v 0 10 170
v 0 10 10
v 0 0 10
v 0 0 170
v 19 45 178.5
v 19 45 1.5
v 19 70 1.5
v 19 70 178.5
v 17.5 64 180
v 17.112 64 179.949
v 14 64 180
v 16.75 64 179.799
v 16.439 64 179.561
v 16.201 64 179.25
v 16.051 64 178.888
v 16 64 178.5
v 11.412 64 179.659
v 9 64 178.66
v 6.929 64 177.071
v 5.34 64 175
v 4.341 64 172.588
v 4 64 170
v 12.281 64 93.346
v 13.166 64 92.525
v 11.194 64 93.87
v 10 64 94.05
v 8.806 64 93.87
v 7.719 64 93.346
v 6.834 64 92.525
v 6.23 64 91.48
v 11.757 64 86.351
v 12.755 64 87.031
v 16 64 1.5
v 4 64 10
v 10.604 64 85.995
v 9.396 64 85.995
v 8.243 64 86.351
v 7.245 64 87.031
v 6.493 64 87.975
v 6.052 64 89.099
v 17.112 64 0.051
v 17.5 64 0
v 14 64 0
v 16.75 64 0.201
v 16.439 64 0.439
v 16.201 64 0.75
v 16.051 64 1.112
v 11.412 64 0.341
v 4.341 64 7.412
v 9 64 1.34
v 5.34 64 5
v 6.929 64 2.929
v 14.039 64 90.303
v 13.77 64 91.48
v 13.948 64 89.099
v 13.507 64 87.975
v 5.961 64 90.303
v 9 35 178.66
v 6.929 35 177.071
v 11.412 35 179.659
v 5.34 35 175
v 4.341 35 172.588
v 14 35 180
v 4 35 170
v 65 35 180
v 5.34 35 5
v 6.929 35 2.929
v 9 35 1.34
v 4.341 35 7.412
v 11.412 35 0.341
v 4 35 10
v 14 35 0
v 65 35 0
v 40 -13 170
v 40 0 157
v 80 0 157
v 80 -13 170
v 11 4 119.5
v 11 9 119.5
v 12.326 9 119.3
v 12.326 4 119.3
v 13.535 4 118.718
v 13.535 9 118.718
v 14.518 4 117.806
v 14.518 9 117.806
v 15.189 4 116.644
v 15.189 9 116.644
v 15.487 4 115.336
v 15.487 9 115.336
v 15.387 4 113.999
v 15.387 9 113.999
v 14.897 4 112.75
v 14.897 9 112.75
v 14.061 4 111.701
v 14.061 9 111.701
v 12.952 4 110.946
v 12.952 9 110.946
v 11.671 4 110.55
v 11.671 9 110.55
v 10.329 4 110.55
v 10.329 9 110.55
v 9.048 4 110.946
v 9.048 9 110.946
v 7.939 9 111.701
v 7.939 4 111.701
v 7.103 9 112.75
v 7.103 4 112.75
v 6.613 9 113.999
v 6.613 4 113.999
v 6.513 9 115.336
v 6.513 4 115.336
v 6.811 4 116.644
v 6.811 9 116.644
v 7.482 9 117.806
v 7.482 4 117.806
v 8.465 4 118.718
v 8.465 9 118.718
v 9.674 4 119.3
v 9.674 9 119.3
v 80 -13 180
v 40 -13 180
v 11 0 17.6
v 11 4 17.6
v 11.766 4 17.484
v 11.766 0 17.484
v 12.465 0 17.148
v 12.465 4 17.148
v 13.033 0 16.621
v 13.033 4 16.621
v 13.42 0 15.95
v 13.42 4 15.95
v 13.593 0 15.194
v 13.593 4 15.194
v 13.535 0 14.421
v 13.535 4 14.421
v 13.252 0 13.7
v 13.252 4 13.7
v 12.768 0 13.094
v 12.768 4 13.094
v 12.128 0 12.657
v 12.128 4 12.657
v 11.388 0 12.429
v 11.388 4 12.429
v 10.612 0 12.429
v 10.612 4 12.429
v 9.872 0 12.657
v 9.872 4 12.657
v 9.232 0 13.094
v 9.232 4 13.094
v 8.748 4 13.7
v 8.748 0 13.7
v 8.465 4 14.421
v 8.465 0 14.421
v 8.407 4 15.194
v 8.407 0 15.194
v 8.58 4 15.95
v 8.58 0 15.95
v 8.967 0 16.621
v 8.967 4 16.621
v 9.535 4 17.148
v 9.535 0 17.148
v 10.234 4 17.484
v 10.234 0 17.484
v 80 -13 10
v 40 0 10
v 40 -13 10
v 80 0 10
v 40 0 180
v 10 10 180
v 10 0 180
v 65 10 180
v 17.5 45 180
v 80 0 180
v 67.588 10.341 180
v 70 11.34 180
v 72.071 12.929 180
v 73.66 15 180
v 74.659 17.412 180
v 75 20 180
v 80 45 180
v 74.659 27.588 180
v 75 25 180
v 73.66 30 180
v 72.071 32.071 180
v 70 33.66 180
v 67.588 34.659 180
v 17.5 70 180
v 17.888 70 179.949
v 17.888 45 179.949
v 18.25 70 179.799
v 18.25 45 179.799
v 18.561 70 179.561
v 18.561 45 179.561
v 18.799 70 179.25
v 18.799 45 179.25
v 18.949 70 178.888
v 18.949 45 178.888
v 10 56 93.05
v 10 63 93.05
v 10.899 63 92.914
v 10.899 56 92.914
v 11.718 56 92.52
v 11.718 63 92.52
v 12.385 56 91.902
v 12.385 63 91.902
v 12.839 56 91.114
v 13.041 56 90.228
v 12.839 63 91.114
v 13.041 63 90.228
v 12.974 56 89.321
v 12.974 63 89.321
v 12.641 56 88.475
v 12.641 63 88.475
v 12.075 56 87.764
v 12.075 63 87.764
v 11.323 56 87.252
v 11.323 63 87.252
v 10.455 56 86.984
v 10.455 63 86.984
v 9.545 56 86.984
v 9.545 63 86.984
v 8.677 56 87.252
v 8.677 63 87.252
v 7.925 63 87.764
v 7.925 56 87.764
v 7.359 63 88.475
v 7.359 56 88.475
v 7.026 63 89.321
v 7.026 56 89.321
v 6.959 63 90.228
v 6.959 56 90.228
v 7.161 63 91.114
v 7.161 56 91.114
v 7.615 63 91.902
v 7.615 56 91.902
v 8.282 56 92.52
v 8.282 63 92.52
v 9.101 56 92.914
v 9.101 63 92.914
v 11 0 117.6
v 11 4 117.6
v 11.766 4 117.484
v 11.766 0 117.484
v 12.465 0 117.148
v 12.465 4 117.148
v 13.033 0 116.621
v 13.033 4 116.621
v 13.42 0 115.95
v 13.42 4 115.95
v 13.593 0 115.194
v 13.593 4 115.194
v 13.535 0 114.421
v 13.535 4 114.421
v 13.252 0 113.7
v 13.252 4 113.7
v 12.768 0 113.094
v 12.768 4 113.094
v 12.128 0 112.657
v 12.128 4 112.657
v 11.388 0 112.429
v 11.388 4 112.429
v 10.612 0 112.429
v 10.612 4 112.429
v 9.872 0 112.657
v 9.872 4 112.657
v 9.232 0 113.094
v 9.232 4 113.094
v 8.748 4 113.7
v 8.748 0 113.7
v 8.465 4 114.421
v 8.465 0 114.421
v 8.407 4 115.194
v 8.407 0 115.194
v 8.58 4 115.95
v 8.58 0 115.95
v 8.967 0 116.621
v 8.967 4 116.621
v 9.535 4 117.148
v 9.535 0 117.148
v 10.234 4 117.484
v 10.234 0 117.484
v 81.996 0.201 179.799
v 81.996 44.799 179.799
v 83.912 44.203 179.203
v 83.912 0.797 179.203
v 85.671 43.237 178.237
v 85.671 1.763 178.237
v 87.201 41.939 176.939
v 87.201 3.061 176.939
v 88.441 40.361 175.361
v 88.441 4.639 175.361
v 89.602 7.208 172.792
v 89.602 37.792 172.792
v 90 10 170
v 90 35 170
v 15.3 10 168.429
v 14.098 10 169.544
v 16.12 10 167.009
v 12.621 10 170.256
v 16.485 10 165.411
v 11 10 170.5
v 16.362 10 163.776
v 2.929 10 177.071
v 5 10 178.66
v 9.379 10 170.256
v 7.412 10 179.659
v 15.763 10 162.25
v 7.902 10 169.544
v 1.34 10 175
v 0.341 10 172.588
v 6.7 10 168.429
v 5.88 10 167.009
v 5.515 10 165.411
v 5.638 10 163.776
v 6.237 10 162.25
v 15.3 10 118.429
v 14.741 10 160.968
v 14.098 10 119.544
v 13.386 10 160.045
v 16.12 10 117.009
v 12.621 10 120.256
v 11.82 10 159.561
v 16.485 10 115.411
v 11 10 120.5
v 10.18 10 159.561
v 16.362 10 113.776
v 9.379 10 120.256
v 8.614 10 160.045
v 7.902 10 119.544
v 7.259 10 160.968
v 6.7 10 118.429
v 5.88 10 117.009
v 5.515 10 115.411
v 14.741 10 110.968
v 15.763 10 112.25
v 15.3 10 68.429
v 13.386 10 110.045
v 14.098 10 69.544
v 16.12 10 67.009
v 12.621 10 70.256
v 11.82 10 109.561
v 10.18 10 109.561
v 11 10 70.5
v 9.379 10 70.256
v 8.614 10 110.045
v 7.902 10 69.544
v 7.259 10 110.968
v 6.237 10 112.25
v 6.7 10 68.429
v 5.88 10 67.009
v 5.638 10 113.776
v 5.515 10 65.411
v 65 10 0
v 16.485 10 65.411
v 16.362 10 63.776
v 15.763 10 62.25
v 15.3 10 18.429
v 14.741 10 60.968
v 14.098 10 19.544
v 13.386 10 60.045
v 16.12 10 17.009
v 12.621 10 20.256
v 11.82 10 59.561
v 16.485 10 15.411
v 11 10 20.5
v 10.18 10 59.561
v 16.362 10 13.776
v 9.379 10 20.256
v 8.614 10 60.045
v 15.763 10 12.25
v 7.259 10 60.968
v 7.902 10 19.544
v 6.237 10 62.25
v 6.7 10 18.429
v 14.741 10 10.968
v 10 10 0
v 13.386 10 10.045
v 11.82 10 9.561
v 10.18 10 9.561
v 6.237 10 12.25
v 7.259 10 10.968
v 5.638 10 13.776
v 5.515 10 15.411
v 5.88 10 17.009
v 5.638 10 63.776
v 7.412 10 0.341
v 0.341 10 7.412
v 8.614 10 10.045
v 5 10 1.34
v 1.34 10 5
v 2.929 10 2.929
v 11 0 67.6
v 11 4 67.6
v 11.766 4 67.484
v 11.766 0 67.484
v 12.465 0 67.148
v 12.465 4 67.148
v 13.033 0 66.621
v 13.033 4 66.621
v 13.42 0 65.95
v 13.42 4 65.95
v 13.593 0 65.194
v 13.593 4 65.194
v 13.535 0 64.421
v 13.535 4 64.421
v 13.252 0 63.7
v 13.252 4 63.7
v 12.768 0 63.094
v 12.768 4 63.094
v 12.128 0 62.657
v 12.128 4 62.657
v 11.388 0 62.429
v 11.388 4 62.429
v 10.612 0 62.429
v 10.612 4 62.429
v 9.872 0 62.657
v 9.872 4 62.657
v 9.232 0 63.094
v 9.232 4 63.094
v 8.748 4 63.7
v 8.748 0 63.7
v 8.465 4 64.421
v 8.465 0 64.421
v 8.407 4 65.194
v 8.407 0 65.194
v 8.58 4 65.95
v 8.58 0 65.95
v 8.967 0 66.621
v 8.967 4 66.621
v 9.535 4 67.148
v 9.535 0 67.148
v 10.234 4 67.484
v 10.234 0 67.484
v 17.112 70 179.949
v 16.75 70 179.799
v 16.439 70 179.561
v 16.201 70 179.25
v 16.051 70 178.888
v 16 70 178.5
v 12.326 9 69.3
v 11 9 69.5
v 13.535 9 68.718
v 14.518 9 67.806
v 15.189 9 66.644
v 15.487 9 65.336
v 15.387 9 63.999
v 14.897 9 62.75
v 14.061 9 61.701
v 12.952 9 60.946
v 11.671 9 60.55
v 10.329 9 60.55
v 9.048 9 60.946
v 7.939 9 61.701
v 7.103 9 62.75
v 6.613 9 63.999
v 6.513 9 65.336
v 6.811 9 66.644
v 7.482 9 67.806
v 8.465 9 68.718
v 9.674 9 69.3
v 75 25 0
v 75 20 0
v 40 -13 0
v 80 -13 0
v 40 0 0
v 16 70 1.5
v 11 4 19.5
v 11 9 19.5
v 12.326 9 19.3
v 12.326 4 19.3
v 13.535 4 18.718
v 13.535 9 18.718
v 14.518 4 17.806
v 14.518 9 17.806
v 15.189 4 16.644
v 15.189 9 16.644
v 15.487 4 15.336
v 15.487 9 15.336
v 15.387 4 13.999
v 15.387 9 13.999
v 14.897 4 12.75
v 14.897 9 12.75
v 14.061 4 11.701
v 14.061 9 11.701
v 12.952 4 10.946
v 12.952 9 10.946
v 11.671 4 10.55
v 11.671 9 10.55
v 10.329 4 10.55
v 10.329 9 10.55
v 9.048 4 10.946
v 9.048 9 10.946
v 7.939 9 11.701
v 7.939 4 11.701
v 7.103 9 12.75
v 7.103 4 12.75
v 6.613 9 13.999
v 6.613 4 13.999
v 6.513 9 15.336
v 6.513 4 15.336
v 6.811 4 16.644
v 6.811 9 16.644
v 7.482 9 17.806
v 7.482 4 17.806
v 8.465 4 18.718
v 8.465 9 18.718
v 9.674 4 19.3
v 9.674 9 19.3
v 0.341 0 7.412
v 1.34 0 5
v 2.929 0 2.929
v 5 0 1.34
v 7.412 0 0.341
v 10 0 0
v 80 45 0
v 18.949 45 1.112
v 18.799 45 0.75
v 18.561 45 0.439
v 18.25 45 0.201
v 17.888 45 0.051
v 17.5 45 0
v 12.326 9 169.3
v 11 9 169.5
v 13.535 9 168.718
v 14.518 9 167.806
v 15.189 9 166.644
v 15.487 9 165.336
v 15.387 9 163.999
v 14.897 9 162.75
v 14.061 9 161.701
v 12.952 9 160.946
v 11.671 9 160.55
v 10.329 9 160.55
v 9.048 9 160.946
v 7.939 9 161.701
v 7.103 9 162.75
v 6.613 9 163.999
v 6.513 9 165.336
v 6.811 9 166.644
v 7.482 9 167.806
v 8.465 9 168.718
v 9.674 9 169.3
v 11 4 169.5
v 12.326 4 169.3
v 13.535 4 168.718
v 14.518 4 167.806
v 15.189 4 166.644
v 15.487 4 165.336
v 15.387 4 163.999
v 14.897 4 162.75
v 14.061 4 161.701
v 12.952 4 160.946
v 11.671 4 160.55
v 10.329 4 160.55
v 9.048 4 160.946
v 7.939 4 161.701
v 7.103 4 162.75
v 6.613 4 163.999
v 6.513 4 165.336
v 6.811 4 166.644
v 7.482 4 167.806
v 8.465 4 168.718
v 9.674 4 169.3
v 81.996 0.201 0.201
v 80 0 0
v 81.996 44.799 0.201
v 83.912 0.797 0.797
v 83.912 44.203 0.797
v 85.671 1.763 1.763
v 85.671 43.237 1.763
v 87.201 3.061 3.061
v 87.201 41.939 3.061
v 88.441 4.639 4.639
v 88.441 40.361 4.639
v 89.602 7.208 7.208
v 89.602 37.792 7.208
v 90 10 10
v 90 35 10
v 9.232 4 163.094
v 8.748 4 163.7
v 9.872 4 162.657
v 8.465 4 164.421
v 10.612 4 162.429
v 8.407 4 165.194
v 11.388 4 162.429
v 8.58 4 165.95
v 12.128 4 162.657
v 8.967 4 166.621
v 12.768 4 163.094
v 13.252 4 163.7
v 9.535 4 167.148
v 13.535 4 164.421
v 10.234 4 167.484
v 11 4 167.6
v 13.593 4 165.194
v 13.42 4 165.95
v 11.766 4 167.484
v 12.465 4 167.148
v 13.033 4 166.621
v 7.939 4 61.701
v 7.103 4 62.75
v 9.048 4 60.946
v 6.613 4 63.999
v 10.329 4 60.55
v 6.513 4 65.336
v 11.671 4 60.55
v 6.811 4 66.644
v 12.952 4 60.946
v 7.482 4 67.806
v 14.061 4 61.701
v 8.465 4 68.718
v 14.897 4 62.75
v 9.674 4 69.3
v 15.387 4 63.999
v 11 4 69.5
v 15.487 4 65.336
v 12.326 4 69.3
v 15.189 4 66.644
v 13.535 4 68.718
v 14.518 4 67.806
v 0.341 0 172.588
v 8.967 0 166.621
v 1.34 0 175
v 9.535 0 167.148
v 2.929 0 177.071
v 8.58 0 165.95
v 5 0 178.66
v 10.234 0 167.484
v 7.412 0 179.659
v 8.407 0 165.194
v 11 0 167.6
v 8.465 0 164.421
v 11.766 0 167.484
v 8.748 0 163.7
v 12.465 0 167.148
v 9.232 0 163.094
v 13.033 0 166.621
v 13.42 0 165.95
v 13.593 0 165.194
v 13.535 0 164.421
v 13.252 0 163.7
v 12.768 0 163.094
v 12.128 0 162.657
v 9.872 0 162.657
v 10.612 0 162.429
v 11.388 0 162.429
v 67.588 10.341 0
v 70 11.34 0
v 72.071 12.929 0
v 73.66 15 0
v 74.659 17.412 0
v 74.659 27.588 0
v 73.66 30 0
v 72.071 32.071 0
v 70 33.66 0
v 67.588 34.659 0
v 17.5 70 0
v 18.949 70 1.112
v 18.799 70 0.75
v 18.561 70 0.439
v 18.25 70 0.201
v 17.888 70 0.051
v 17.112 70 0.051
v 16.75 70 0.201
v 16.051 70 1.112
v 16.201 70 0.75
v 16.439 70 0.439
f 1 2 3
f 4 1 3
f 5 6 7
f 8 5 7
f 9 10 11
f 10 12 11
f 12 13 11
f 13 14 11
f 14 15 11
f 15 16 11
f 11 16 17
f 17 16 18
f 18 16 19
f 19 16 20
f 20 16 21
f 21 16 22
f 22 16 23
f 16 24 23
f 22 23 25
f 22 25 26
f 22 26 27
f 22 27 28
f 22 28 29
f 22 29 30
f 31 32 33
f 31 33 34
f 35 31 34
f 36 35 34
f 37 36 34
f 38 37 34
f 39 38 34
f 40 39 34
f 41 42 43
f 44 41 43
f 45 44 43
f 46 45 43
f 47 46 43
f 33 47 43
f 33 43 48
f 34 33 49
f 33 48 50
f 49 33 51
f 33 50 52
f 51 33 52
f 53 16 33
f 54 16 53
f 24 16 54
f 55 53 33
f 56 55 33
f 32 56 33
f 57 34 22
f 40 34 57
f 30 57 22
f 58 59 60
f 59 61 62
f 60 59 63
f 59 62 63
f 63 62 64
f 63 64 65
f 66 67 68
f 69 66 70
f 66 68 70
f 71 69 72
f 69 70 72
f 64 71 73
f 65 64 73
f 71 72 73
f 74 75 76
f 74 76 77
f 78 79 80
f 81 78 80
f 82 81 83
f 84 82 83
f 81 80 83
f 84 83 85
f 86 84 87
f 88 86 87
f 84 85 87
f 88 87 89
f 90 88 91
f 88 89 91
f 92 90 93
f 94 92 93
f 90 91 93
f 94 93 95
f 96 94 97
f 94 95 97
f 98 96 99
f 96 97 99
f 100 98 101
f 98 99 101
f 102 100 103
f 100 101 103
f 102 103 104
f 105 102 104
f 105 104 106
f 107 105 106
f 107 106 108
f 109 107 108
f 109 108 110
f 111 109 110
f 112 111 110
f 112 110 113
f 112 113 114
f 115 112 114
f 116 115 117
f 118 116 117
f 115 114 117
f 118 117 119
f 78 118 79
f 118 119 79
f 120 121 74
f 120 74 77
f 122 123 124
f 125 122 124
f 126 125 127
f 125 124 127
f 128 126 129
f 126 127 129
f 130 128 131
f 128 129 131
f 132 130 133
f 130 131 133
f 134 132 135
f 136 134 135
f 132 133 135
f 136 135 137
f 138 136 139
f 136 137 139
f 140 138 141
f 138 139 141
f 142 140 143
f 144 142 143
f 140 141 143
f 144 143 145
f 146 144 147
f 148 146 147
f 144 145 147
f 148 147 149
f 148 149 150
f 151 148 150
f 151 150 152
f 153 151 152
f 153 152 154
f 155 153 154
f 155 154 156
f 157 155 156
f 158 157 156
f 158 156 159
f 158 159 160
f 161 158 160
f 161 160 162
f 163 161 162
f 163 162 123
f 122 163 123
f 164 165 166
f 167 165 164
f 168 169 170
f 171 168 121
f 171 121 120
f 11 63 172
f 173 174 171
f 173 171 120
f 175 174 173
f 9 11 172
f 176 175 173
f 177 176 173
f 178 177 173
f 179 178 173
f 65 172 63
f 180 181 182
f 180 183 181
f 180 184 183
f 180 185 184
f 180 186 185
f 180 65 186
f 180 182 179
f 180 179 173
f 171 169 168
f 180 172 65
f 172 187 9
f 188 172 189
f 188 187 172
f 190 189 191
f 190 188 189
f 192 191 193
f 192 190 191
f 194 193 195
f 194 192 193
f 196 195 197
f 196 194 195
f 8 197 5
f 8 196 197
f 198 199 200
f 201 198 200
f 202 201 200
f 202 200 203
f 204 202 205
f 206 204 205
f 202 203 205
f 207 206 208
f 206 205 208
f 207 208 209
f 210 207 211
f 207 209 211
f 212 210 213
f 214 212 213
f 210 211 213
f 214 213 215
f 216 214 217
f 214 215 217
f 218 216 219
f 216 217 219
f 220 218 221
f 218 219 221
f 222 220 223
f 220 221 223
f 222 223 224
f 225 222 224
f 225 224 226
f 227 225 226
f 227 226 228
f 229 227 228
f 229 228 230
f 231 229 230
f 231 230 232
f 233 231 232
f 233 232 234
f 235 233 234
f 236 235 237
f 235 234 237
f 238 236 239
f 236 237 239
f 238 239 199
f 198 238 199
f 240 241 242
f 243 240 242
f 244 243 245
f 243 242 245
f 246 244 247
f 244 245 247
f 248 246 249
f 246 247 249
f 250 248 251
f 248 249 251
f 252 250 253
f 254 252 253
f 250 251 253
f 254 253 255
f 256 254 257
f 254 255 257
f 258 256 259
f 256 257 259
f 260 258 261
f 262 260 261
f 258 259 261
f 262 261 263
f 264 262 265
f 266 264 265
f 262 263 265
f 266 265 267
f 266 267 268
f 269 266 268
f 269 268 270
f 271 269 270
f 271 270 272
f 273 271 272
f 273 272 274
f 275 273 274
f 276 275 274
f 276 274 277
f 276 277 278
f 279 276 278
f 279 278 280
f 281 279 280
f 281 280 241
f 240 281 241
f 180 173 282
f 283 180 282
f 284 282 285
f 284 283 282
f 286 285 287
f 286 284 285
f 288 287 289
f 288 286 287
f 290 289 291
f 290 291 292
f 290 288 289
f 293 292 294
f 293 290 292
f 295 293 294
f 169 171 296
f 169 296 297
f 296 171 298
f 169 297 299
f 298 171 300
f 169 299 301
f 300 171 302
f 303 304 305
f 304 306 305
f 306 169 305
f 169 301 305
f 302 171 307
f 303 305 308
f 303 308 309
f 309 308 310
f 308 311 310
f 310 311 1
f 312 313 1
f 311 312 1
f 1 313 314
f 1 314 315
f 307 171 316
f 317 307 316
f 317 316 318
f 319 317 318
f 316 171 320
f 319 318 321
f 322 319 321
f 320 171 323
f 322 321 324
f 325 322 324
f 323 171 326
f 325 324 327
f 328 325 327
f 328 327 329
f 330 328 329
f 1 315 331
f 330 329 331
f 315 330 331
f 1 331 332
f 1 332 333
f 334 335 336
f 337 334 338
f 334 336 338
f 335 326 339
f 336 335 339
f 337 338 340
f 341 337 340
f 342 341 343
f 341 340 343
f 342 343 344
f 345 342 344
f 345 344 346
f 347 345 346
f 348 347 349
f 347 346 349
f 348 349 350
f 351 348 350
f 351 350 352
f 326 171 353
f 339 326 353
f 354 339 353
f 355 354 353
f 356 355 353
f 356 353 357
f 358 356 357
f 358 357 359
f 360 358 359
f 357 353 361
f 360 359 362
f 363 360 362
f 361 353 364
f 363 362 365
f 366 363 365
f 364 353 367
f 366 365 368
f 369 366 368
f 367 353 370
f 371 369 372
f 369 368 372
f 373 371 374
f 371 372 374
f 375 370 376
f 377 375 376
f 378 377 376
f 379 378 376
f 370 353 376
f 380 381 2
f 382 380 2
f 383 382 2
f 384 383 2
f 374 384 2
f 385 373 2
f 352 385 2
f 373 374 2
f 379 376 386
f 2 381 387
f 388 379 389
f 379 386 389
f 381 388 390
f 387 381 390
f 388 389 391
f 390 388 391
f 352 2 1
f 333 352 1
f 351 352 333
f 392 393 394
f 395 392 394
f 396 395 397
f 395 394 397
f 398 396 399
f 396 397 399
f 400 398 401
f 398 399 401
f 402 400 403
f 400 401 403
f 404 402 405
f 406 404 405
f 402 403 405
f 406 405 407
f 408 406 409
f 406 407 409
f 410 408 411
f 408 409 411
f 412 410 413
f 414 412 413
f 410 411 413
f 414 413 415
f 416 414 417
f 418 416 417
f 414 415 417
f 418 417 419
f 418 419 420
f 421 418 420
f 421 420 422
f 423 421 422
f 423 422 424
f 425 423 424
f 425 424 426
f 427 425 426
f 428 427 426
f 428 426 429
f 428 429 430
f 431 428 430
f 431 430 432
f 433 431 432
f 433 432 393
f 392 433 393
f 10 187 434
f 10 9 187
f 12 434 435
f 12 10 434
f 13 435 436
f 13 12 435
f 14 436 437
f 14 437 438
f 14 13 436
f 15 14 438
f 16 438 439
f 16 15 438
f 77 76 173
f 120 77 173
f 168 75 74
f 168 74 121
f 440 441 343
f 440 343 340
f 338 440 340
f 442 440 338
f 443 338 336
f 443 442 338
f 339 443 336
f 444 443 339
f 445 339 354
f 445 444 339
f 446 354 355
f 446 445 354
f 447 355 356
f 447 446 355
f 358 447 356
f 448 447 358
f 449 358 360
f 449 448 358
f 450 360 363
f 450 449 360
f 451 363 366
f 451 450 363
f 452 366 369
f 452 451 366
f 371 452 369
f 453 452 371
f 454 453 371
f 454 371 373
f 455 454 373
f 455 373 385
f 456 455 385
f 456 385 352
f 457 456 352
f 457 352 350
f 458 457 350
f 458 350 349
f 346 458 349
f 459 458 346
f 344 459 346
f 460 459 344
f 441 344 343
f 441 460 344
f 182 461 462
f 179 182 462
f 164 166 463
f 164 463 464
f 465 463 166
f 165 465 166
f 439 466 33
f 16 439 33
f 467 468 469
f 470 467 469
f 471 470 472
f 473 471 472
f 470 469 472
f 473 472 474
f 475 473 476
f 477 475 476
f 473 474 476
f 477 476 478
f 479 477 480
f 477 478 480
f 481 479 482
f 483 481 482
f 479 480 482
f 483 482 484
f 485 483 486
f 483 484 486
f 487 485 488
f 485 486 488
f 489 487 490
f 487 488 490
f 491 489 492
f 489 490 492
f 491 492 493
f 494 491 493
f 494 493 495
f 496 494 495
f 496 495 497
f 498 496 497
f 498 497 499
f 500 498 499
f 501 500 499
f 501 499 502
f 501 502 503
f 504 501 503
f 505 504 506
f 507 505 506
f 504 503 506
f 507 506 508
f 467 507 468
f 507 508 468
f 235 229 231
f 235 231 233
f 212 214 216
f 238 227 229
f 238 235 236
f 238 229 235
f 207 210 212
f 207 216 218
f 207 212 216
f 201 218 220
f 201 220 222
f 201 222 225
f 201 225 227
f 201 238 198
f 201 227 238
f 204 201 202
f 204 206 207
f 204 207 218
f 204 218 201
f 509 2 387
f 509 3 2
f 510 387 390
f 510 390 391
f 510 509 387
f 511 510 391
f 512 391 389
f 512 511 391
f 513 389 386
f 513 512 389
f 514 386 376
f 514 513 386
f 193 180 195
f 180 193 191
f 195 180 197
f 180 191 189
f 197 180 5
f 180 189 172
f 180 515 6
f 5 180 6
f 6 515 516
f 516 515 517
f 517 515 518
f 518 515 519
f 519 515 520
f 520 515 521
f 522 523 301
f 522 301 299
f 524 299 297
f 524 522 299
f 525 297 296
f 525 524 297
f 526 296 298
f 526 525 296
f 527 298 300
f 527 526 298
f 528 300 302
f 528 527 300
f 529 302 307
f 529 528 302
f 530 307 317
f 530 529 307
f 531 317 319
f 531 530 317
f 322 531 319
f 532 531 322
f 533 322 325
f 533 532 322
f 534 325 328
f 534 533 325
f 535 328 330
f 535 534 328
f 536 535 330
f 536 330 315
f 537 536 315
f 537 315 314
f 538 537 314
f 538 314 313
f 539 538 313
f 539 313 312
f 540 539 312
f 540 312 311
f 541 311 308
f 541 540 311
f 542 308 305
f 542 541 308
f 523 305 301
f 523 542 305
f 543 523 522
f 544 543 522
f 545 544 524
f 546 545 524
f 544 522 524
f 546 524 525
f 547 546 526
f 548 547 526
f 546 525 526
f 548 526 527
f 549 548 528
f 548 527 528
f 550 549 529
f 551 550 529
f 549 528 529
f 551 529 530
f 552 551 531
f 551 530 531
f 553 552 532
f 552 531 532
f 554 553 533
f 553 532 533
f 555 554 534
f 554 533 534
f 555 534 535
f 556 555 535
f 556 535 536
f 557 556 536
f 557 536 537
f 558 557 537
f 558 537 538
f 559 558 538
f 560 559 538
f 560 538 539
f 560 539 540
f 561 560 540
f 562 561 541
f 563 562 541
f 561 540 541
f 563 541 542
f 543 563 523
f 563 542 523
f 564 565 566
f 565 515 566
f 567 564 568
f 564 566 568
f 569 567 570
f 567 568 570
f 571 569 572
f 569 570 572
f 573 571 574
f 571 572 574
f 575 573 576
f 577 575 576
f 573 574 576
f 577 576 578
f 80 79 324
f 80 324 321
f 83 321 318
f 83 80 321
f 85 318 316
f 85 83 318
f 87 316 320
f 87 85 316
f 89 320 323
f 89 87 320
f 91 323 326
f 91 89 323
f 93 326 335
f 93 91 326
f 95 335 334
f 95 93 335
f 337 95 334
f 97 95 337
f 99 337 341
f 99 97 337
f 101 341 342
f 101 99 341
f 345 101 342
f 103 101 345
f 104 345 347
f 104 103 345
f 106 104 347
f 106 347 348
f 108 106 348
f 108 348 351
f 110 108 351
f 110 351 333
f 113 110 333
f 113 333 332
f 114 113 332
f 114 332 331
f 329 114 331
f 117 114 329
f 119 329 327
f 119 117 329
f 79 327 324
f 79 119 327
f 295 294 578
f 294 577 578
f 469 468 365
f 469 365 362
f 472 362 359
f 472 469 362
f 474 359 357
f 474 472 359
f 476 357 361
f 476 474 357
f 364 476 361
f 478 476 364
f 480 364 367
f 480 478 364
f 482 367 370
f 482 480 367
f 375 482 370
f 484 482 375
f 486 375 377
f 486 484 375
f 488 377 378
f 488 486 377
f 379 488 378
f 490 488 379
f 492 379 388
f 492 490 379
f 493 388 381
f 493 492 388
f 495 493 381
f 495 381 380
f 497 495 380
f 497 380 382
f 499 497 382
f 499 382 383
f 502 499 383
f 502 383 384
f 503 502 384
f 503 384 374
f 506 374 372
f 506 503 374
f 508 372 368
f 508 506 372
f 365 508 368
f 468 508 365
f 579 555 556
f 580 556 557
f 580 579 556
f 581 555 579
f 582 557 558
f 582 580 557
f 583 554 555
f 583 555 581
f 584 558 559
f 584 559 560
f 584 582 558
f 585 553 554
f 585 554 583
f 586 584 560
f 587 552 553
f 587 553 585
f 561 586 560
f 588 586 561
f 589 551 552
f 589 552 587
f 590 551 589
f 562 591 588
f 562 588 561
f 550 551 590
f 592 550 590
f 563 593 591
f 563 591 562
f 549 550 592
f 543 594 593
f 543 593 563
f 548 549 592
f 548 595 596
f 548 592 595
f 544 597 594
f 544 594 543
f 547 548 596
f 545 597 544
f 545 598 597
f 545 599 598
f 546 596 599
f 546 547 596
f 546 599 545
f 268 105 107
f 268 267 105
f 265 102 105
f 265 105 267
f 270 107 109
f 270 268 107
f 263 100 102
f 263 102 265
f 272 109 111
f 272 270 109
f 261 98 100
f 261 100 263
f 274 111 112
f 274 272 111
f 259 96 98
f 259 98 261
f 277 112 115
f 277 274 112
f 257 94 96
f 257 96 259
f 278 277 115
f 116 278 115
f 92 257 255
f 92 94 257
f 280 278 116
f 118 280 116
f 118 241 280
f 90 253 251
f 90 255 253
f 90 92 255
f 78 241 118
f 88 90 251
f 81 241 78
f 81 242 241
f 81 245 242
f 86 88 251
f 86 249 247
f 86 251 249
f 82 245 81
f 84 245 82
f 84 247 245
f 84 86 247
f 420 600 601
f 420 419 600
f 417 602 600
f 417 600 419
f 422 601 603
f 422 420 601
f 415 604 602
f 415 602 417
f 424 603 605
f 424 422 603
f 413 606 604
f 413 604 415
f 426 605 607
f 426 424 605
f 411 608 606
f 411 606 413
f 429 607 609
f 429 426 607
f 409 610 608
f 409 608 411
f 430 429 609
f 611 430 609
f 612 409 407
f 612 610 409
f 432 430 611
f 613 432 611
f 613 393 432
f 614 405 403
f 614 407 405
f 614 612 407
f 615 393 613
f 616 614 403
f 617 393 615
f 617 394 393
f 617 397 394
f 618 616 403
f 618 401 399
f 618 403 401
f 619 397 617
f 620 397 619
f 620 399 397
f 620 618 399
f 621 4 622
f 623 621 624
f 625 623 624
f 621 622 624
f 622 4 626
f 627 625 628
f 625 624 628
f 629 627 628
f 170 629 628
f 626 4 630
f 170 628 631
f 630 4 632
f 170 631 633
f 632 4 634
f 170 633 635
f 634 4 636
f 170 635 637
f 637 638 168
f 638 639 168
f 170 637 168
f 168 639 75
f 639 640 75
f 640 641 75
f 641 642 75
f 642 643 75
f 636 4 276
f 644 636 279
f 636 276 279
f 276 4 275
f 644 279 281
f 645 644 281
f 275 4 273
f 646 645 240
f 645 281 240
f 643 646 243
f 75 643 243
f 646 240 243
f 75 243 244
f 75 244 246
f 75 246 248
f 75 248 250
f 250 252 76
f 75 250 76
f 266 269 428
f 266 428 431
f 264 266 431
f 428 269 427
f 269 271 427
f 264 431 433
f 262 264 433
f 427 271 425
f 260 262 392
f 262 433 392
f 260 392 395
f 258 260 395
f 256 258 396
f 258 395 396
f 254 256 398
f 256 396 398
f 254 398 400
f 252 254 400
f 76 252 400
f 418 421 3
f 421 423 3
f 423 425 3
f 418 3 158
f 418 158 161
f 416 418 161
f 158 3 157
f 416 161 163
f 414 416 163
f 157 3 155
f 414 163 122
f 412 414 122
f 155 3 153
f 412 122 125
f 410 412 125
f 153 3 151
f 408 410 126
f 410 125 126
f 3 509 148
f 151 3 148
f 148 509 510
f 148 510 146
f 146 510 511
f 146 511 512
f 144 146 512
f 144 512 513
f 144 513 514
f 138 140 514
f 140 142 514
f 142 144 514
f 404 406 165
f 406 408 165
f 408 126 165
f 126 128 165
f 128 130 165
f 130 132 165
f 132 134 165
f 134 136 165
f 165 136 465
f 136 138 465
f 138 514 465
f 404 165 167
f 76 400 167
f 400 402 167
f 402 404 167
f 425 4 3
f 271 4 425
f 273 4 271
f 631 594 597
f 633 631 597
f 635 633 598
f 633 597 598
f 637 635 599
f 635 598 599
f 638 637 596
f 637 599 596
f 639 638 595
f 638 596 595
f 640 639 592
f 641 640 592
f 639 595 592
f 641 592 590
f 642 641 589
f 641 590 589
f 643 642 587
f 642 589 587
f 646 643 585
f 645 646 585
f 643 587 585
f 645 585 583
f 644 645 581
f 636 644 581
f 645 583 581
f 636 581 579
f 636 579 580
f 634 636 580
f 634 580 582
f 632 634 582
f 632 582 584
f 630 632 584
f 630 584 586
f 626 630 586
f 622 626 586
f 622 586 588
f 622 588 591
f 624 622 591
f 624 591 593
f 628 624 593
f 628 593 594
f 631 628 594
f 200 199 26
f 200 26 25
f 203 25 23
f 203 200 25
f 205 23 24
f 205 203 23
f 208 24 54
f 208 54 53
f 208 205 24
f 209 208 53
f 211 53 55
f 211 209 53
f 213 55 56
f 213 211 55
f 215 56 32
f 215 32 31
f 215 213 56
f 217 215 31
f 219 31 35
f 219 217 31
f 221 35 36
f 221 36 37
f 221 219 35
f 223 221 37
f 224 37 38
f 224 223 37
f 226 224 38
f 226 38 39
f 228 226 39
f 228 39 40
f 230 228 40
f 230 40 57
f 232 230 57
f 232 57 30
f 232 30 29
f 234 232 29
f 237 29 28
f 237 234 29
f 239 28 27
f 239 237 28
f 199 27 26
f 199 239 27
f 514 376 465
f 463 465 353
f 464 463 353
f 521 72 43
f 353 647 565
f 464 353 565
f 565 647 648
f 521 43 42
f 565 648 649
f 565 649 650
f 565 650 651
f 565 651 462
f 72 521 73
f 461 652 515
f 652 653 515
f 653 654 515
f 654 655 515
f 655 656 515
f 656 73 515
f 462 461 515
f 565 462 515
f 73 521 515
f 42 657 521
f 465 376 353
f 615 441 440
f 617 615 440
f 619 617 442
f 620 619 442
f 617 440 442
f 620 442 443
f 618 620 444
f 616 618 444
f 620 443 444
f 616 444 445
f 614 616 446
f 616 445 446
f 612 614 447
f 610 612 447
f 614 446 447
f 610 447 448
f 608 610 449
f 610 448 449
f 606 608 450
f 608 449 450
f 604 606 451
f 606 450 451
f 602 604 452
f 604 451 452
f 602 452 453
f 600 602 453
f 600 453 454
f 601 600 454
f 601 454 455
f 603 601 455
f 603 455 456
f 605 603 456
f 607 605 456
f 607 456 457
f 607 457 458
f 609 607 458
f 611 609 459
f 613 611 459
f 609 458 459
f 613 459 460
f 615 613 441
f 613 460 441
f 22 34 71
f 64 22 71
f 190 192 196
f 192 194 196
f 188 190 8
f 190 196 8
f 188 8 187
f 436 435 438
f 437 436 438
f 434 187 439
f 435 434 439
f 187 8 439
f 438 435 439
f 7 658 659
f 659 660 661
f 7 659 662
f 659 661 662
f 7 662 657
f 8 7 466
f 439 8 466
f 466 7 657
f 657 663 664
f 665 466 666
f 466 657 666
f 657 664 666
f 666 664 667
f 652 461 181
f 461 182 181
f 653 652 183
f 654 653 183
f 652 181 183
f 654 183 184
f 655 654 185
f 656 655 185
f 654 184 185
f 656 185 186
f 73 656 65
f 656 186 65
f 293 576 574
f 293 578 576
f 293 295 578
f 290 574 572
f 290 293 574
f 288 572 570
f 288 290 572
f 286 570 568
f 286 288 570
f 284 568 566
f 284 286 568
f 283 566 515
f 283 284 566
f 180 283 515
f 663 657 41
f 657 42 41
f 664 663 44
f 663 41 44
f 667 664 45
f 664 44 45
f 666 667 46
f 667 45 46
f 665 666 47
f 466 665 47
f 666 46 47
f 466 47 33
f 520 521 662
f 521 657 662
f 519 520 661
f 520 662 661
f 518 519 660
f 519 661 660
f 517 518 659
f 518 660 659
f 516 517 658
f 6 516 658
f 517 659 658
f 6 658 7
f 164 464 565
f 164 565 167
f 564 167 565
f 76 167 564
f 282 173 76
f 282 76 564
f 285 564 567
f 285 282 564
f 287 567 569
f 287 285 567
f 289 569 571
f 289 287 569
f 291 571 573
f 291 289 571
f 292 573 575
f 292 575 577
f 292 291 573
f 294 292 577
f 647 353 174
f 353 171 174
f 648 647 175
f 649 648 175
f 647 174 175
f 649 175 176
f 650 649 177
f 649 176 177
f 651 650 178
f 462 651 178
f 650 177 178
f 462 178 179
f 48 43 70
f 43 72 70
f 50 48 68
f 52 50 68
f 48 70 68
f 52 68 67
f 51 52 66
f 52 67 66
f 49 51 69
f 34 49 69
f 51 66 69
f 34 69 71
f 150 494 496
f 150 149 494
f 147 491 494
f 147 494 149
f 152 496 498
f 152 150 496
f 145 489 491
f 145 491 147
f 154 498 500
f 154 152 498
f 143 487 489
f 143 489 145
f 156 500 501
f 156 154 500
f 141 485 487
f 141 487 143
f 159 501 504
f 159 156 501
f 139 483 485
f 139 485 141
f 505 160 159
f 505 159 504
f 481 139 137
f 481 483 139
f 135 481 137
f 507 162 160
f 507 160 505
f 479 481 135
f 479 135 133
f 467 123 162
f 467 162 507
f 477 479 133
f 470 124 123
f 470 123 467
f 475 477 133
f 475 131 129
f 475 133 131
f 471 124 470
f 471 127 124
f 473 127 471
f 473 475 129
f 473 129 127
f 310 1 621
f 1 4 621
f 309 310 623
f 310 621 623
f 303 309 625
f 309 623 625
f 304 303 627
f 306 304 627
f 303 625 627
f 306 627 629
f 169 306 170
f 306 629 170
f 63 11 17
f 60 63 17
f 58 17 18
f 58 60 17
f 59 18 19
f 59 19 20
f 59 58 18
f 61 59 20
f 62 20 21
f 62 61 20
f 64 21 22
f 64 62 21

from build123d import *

# Parameters (mm, degrees)
BOSS_EXTRUDE1_DEPTH = 180
SKETCH2_R           = 2.6
CUT_EXTRUDE1_DEPTH  = 211
SKETCH2_3_R         = 4.5
CUT_EXTRUDE2_DEPTH  = 6
SKETCH3_R           = 3.05
CUT_EXTRUDE3_DEPTH  = 8
FILLET4_R           = 10
CHAMFER1_SIZE       = 1
FILLET5_R           = 1.5
SKETCH4_W           = 40
SKETCH4_H           = 10
BOSS_EXTRUDE2_DEPTH = 13
CHAMFER2_SIZE       = 13


# Some blends are built 0.0001 mm under size
with BuildPart() as part:
    # Sketch1 → Boss-Extrude1 (new body)
    with BuildSketch(Plane.XY):
        Polygon((0, 10), (0, 0), (90, 0), (90, 45), (19, 45), (19, 70), (16, 70), (16, 64), (4, 64), (4, 35), (75, 35), (75, 10), align=None)
    extrude(amount=BOSS_EXTRUDE1_DEPTH)

    # Sketch2 → Cut-Extrude1 (cut, through all)
    with BuildSketch(Plane(origin=(0, 10, 0), x_dir=(1, 0, 0), z_dir=(0, 1, 0))):
        with Locations(Location((11, -65, 0), (0, 0, 270))):
            Circle(SKETCH2_R)
        with Locations(Location((11, -15, 0), (0, 0, 270))):
            Circle(SKETCH2_R)
        with Locations(Location((11, -115, 0), (0, 0, 270))):
            Circle(SKETCH2_R)
        with Locations(Location((11, -165, 0), (0, 0, 270))):
            Circle(SKETCH2_R)
    extrude(amount=-CUT_EXTRUDE1_DEPTH, mode=Mode.SUBTRACT)

    # Sketch2<3> → Cut-Extrude2 (cut)
    with BuildSketch(Plane(origin=(0, 10, 0), x_dir=(1, 0, 0), z_dir=(0, 1, 0))):
        with Locations(Location((11, -65, 0), (0, 0, 270))):
            Circle(SKETCH2_3_R)
        with Locations(Location((11, -15, 0), (0, 0, 270))):
            Circle(SKETCH2_3_R)
        with Locations(Location((11, -115, 0), (0, 0, 270))):
            Circle(SKETCH2_3_R)
        with Locations(Location((11, -165, 0), (0, 0, 270))):
            Circle(SKETCH2_3_R)
    extrude(amount=-CUT_EXTRUDE2_DEPTH, mode=Mode.SUBTRACT)

    # Sketch3 → Cut-Extrude3 (cut)
    with BuildSketch(Plane(origin=(0, 64, 0), x_dir=(1, 0, 0), z_dir=(0, 1, 0))):
        with Locations(Location((10, -90, 0), (0, 0, 270))):
            Circle(SKETCH3_R)
    extrude(amount=-CUT_EXTRUDE3_DEPTH, mode=Mode.SUBTRACT)

    # Fillet4
    fillet4_edges = [part.edges().sort_by_distance(p)[0] for p in [
        (90, 22.5, 180),
        (0, 5, 0),
        (4, 49.5, 0),
        (90, 22.5, 0),
        (75, 10, 90),
        (75, 35, 90),
        (90, 45, 90),
        (90, 0, 90),
        (4, 49.5, 180),
        (0, 5, 180),
    ]]
    fillet(fillet4_edges, radius=FILLET4_R)

    # Chamfer1
    chamfer1_edges = [part.edges().sort_by_distance(p)[0] for p in [
        (10, 64, 86.95),
        (11, 10, 10.5),
        (11, 10, 60.5),
        (11, 10, 110.5),
        (11, 10, 160.5),
    ]]
    chamfer(chamfer1_edges, length=CHAMFER1_SIZE)

    # Fillet5
    fillet5_edges = [part.edges().sort_by_distance(p)[0] for p in [
        (19, 57.5, 0),
        (16, 67, 0),
        (19, 57.5, 180),
        (16, 67, 180),
    ]]
    fillet(fillet5_edges, radius=FILLET5_R - 0.0001)  # a hair under: the kernel refuses the full size

    # Sketch4 → Boss-Extrude2 (add)
    with BuildSketch(Plane.XZ):
        with Locations((60, 5)):
            Rectangle(SKETCH4_W, SKETCH4_H)
        with Locations((60, 175)):
            Rectangle(SKETCH4_W, SKETCH4_H)
    extrude(amount=BOSS_EXTRUDE2_DEPTH)

    # Chamfer2
    # the kernel refuses this chamfer: 13 mm, written as the material it adds along each edge
    with BuildSketch(Plane(origin=(40, 0, 170), x_dir=(0, 0.027495876610586372, -0.9996219169112968), z_dir=(1, 0, 0))) as chamfer2_piece_1_section:
        Polygon((CHAMFER2_SIZE * 0.999621916911, -CHAMFER2_SIZE * 0.0274958766106), (-CHAMFER2_SIZE * 0.0274958766106, -CHAMFER2_SIZE * 0.999621916911), (0, 0), align=None)
    chamfer2_piece_1 = extrude(amount=40, mode=Mode.PRIVATE)
    chamfer2_piece_1 = split(chamfer2_piece_1, bisect_by=Plane(origin=(60, -13, 165.704745994), z_dir=(0, 1, 0)), keep=Keep.TOP, mode=Mode.PRIVATE)
    add(chamfer2_piece_1)


solid = part.part
